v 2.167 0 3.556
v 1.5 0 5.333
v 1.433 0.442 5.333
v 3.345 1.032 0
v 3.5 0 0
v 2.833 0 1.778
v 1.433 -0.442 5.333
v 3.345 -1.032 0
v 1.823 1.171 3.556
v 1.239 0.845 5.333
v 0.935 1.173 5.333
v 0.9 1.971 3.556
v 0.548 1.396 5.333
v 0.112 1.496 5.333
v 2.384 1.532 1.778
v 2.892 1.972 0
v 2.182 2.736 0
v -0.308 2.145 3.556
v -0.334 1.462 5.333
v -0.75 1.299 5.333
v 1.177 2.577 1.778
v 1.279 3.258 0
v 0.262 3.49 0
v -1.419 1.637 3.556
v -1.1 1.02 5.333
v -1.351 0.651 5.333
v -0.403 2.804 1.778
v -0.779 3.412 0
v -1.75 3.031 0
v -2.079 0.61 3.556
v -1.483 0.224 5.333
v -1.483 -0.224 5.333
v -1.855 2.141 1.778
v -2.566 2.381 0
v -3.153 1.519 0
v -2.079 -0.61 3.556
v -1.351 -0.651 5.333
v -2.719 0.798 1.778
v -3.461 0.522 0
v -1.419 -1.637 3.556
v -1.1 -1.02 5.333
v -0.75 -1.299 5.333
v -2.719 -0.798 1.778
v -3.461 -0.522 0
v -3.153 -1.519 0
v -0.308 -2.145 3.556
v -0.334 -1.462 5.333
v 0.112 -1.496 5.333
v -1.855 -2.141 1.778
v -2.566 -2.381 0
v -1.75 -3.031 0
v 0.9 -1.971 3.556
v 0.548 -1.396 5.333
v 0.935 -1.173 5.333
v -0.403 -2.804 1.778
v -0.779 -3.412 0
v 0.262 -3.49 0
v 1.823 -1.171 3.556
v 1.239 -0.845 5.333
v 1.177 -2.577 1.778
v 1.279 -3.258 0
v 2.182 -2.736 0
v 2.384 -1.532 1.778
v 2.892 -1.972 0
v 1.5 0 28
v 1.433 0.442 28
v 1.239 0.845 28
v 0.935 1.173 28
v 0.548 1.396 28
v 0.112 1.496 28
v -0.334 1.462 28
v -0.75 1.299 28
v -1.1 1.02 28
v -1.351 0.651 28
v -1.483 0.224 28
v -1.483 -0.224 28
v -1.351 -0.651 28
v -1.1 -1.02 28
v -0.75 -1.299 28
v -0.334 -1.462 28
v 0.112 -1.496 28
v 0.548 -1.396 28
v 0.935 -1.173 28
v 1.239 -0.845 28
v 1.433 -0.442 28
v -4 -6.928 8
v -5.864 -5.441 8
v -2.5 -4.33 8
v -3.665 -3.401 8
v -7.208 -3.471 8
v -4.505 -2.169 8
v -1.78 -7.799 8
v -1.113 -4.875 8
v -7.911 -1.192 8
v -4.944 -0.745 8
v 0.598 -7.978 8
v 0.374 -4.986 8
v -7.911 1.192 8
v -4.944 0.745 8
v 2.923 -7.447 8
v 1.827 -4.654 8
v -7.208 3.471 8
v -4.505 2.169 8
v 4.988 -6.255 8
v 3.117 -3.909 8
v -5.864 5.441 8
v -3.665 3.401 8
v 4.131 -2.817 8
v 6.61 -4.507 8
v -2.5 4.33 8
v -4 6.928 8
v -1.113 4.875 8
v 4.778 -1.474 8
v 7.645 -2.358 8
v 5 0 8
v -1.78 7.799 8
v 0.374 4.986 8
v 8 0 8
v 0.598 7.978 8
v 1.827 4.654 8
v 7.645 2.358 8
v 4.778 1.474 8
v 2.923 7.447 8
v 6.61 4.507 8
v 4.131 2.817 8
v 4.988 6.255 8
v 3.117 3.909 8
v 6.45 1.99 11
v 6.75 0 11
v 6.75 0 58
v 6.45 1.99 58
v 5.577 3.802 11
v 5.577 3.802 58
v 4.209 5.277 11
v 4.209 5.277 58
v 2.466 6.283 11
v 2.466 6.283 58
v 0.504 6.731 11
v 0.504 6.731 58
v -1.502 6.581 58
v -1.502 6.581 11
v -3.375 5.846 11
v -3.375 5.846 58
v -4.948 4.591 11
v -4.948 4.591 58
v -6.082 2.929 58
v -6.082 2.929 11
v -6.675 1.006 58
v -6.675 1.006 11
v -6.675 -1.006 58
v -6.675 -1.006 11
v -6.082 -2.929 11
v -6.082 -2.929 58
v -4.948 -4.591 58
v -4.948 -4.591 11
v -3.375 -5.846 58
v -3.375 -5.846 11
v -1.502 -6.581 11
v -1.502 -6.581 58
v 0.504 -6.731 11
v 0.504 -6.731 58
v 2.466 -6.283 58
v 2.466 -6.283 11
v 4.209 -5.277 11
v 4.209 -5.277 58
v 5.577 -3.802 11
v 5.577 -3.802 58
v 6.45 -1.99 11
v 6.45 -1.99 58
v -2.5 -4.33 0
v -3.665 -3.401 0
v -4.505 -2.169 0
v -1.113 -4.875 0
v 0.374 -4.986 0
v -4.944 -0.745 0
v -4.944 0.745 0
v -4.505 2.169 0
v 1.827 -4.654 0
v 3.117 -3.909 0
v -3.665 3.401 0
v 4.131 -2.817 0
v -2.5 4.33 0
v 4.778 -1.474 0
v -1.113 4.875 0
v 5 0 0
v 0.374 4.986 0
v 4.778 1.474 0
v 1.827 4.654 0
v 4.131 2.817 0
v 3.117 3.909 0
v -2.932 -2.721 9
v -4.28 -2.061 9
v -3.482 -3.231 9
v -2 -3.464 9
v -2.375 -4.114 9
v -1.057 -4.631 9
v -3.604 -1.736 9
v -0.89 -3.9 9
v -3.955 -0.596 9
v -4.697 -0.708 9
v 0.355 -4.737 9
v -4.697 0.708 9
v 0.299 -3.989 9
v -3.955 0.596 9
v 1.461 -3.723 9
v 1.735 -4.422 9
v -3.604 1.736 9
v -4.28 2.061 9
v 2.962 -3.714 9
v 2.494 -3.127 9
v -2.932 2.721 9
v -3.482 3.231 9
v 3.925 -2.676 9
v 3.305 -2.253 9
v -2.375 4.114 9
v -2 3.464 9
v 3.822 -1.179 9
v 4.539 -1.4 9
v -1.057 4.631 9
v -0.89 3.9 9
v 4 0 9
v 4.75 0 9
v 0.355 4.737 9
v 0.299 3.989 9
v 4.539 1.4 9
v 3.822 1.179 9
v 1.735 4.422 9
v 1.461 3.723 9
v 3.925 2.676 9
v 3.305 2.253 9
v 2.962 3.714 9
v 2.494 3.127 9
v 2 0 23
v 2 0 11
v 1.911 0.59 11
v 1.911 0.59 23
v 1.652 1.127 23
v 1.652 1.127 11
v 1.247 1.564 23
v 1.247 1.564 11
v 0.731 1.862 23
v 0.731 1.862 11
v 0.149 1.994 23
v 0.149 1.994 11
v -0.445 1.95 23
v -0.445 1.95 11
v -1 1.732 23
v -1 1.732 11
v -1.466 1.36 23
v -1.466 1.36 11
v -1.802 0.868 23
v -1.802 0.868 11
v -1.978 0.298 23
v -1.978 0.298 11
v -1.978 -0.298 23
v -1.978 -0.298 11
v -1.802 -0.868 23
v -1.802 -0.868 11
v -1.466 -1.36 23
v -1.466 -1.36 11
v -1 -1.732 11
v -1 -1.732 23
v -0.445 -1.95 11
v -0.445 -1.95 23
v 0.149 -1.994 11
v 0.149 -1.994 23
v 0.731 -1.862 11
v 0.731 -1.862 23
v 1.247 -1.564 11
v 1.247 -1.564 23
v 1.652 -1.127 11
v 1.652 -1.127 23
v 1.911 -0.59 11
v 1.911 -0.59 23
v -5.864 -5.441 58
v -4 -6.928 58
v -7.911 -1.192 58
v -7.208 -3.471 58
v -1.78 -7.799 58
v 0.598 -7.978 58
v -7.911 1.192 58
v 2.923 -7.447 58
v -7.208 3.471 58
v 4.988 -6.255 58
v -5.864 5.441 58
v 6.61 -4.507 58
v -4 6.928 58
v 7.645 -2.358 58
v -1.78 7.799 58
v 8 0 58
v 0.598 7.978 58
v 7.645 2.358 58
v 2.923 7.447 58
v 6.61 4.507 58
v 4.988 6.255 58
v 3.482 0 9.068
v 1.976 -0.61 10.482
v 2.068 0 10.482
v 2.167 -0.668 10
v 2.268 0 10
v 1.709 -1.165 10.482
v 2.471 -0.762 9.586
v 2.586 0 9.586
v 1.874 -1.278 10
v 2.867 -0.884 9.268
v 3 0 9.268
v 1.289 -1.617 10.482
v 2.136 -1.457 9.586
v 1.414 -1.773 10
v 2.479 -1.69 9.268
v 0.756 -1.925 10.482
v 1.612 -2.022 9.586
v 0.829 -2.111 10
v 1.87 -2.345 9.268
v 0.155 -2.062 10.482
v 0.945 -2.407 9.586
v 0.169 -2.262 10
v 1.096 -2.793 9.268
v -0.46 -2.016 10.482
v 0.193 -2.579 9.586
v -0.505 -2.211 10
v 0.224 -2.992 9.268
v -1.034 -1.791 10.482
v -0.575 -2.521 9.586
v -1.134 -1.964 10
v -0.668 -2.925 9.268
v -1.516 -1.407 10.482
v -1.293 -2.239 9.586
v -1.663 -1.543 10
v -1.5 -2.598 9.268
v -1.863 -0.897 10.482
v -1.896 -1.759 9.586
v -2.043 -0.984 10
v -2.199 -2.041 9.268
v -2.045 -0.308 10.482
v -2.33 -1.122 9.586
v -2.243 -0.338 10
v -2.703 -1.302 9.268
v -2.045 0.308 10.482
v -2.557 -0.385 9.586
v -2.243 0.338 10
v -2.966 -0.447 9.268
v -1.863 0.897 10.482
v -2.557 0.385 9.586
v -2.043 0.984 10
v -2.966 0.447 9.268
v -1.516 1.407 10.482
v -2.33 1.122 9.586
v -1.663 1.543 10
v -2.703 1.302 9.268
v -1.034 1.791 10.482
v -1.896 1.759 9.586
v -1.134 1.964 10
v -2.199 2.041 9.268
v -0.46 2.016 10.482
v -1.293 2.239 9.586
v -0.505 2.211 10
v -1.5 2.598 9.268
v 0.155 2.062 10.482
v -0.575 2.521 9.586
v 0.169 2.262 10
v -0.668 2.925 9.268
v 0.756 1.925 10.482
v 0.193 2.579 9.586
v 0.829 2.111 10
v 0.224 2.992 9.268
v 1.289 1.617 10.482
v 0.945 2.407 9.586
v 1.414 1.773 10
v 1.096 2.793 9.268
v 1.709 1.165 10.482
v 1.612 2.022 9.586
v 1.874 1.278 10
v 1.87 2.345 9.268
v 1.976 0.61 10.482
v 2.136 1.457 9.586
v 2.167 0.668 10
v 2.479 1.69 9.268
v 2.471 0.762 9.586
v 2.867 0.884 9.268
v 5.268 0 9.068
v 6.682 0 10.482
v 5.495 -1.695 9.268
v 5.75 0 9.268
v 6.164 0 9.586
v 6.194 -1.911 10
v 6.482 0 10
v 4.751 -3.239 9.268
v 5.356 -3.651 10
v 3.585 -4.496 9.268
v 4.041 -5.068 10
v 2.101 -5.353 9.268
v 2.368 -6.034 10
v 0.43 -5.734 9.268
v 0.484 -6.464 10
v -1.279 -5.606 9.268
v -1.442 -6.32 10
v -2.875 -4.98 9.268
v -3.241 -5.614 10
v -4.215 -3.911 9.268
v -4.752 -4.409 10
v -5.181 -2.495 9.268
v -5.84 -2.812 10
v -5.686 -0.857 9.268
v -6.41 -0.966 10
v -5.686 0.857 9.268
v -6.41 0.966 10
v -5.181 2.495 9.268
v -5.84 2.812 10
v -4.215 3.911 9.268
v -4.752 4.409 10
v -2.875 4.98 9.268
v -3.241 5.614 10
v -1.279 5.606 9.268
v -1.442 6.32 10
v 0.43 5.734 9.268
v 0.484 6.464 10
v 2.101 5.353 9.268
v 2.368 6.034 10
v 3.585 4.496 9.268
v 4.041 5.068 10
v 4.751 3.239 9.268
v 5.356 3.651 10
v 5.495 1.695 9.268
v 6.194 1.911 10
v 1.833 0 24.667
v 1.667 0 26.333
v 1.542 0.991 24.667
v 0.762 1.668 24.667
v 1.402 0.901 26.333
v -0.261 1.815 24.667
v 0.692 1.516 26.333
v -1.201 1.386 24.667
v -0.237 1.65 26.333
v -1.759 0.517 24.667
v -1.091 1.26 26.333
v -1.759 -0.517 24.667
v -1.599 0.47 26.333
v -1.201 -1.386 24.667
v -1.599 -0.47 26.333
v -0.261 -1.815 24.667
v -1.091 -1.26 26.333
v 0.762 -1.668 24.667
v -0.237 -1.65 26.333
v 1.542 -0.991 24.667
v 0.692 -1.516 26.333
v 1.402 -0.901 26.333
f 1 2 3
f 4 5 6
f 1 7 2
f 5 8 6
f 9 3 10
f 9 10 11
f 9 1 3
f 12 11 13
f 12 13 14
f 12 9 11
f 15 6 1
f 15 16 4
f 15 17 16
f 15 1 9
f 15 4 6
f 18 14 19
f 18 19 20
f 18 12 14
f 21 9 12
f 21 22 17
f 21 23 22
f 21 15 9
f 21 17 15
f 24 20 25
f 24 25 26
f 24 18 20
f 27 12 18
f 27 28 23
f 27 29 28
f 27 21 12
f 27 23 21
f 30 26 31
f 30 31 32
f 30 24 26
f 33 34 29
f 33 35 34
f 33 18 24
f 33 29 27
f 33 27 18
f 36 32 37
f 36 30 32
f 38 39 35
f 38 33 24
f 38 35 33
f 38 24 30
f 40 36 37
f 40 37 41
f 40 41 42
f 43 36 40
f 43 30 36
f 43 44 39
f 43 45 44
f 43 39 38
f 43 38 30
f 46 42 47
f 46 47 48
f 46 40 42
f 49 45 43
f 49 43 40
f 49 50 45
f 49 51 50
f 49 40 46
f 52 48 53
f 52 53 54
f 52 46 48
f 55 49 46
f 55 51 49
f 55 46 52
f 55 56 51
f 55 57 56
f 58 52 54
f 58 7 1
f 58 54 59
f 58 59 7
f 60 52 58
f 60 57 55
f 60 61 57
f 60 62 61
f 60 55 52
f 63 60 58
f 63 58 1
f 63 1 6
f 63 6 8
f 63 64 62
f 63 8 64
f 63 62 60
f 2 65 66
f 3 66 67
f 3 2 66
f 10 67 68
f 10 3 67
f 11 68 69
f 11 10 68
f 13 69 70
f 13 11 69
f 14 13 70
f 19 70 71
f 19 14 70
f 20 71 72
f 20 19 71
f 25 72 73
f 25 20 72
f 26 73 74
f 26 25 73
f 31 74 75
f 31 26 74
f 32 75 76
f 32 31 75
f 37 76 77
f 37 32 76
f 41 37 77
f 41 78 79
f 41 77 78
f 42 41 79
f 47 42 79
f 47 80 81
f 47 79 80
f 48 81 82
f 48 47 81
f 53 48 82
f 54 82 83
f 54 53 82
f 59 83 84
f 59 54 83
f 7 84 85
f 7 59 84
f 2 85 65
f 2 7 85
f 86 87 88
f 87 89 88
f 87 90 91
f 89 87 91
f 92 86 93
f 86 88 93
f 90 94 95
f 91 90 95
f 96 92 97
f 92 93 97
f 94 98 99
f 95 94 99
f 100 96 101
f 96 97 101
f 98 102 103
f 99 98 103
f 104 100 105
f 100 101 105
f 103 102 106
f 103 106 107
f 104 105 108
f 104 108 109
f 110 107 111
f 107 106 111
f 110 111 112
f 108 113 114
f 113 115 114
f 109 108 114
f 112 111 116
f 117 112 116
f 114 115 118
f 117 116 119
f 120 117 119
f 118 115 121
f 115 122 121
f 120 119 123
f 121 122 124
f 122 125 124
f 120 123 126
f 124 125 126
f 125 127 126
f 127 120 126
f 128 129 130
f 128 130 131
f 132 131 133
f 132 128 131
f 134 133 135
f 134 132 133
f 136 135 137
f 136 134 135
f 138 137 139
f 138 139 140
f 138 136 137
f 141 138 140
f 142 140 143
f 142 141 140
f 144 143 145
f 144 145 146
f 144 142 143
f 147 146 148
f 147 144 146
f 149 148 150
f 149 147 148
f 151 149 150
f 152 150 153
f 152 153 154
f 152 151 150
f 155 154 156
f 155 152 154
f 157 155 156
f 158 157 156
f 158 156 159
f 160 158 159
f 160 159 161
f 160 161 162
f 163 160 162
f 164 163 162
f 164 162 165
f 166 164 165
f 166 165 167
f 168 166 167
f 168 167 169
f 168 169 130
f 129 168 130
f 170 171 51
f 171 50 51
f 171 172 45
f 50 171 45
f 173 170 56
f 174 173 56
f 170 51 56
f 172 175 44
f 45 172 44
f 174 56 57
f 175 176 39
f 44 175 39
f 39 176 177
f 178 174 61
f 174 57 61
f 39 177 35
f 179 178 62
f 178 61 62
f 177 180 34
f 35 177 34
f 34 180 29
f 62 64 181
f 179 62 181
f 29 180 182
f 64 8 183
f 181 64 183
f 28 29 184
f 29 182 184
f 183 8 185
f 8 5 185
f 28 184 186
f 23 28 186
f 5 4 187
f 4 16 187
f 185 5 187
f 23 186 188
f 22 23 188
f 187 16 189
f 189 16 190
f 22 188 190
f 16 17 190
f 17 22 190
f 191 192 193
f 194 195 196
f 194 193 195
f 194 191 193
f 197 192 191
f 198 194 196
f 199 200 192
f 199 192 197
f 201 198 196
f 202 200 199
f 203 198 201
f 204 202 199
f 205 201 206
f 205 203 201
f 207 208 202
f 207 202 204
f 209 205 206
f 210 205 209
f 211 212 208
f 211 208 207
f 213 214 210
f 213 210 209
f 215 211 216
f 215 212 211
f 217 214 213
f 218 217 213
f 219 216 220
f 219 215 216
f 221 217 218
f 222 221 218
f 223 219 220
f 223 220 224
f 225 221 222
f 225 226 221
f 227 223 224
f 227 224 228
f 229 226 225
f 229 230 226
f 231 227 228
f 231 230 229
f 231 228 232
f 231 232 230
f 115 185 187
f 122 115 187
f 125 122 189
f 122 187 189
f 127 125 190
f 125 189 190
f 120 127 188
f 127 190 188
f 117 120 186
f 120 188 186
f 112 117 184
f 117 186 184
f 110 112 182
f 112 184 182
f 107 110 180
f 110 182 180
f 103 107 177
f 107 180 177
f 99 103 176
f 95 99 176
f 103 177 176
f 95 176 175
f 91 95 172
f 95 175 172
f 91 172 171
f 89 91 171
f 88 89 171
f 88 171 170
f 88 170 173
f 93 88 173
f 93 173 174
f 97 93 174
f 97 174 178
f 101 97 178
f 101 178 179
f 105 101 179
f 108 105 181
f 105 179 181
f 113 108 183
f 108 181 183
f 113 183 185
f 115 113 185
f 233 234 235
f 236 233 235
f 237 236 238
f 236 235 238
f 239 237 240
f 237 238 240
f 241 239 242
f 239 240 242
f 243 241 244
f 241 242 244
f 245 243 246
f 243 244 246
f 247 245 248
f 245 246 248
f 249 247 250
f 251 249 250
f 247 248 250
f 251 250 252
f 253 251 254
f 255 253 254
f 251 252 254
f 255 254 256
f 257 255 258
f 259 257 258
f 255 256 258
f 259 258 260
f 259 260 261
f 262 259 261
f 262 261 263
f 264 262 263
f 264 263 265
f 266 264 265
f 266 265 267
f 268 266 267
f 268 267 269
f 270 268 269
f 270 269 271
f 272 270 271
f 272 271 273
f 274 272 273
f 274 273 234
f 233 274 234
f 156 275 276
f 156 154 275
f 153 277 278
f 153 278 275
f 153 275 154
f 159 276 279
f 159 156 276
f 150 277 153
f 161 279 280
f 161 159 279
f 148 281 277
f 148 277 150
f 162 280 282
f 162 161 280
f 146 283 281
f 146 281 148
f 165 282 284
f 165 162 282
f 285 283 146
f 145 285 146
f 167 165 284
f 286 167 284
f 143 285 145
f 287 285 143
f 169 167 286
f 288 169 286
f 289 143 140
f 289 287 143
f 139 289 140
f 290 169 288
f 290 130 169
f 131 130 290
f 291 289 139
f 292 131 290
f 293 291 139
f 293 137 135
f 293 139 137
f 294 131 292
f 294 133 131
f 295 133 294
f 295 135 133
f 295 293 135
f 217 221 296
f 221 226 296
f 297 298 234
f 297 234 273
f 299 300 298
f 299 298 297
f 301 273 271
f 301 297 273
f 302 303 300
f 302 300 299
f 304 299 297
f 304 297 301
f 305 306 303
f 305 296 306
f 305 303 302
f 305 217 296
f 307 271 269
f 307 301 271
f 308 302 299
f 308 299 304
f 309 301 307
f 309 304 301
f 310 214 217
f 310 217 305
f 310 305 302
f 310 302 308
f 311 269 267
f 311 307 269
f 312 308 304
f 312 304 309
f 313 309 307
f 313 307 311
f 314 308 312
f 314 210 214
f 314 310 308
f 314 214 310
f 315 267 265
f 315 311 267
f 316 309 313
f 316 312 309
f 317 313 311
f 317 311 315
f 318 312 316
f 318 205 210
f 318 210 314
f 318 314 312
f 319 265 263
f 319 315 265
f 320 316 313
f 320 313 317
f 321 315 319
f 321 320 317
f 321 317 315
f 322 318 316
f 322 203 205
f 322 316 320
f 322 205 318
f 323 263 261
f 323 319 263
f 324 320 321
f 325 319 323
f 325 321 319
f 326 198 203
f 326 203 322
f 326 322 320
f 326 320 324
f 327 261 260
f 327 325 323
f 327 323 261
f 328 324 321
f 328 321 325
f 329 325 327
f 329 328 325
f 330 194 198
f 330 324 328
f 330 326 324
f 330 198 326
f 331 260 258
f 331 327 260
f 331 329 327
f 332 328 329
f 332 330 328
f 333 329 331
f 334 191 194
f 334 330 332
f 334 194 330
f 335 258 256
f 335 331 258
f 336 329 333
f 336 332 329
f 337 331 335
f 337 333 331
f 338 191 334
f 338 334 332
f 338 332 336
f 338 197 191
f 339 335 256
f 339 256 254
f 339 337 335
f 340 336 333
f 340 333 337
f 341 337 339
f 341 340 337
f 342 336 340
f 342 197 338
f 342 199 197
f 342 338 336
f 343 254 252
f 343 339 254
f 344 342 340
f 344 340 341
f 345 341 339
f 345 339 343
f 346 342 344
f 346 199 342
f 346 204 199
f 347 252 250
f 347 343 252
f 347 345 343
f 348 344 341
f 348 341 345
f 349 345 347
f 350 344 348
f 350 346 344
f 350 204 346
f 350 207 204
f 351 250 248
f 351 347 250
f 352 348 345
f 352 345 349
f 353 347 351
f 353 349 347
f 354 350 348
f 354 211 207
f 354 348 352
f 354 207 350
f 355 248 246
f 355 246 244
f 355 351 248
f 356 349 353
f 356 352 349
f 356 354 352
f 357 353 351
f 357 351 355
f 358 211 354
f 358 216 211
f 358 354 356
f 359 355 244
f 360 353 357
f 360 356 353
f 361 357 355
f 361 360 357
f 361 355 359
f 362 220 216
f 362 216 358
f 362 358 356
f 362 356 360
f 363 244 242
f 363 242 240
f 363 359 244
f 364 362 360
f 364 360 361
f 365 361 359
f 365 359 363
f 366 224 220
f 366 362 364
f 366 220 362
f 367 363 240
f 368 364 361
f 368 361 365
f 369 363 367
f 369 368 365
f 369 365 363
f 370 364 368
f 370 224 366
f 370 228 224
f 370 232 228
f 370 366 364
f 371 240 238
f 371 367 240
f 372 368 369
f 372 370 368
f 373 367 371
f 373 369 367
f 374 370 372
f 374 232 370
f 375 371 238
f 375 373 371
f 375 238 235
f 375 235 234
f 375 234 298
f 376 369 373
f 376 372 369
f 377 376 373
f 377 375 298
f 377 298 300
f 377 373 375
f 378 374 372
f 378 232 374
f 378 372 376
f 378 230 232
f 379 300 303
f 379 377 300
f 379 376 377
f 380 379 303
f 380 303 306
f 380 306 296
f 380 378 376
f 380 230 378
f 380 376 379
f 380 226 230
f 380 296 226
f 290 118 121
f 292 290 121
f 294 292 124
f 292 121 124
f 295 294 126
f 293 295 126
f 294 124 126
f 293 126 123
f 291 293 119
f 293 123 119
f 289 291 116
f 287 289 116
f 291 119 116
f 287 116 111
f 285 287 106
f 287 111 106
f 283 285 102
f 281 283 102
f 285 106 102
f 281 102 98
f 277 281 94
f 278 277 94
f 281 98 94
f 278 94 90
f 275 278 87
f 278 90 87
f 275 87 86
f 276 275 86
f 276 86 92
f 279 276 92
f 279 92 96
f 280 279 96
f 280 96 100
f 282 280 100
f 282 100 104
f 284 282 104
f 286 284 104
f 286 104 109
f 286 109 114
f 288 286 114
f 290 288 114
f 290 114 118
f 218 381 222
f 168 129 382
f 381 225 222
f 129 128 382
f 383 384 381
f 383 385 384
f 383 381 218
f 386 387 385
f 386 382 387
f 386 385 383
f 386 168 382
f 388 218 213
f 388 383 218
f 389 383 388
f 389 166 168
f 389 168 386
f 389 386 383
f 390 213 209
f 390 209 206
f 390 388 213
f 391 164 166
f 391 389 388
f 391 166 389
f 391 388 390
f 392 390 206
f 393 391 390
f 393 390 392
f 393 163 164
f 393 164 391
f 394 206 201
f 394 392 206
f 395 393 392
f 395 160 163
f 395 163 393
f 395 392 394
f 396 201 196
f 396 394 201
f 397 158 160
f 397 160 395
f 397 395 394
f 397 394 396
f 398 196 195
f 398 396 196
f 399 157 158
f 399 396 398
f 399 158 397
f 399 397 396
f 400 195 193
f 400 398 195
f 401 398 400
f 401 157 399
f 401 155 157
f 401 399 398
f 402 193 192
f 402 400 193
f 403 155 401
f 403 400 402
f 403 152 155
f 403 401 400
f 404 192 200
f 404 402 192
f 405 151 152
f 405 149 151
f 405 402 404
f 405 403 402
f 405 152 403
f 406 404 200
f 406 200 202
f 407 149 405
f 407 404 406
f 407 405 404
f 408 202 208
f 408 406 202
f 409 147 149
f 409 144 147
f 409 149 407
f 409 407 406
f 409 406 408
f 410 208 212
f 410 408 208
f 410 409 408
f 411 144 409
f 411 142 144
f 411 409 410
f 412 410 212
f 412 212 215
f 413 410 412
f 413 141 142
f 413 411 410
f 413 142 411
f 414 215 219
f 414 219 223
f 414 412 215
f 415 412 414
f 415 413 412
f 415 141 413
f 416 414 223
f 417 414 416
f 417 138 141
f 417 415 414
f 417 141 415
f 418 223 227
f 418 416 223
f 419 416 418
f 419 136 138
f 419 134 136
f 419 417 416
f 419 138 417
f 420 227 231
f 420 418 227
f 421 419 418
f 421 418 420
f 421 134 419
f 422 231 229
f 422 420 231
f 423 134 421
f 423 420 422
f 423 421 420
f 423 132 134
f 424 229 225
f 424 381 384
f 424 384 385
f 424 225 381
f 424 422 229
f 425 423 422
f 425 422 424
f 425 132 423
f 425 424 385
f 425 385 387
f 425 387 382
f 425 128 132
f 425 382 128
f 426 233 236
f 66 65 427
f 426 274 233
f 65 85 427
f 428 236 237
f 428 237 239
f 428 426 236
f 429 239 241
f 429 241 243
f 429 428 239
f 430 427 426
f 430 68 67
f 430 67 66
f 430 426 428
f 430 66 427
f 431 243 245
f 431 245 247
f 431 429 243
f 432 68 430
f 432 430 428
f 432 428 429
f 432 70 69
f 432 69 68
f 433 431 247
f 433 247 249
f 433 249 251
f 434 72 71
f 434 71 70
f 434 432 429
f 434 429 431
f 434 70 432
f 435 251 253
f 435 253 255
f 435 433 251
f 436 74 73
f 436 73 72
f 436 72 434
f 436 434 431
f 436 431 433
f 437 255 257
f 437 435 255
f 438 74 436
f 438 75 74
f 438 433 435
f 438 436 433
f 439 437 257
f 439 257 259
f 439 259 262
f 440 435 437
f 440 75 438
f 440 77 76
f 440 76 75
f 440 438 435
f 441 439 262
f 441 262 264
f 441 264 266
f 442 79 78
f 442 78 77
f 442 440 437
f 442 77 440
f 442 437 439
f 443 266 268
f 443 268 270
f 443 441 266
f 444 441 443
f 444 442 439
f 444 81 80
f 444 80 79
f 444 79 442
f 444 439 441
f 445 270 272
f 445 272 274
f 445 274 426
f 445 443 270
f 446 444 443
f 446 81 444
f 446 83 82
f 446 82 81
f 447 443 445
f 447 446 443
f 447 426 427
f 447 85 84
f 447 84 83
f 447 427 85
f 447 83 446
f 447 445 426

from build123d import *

# Parameters (mm, degrees)
F0_R        = 5
F0_R_2      = 3.5
F1_DEPTH    = 8
F2_R        = 8
F2_R_2      = 6.75
F2_R_3      = 5
F2_R_4      = 3.5
F2_R_5      = 2
F2_R_6      = 1.5
F3_DEPTH    = 1
F4_DEPTH    = 50
F5_DEPTH    = 25
F6_S5_R     = 1.5
F6_T6_DEPTH = 8
F7_R        = 2
F9_R        = 2


# Not quite as in the source:
# - a fillet or chamfer that OpenCascade refuses, or shapes differently, is made with other operations: its cross-section is extruded or revolved along the edge and cut away or added


with BuildPart() as f1:
    # F0 (on Top) → F1 (new body)
    with BuildSketch(Plane.XY):
        Circle(F0_R)
        Circle(F0_R_2, mode=Mode.SUBTRACT)
    extrude(amount=F1_DEPTH)

    # F2 (on face) → F3 (join)
    with BuildSketch(Plane.XY.offset(8)):
        Circle(F2_R)
        Circle(F2_R_2, mode=Mode.SUBTRACT)
        Circle(F2_R_2)
        Circle(F2_R_3, mode=Mode.SUBTRACT)
        Circle(F2_R_3)
        Circle(F2_R_4, mode=Mode.SUBTRACT)
        Circle(F2_R_4)
        Circle(F2_R_5, mode=Mode.SUBTRACT)
        Circle(F2_R_5)
        Circle(F2_R_6, mode=Mode.SUBTRACT)
    extrude(amount=F3_DEPTH)

    # F2 (on face) → F4 (join)
    with BuildSketch(Plane.XY.offset(8)):
        Circle(F2_R)
        Circle(F2_R_2, mode=Mode.SUBTRACT)
    extrude(amount=F4_DEPTH)

    # F2 (on face) → F5 (join)
    with BuildSketch(Plane.XY.offset(8)):
        Circle(F2_R_5)
        Circle(F2_R_6, mode=Mode.SUBTRACT)
    extrude(amount=F5_DEPTH)

    # F6: chamfer of 8 x 3 on 1 edges, made by hand


with BuildPart() as f6_tool2:
    # F6_s3 → F6_t4 (revolve)
    with BuildSketch(Plane.XZ):
        Polygon((0.5, 8), (3.5, 0), (3.5, 8), align=None)
    revolve(axis=Axis((0, 0, 8), (0, 0, 1)))

    # F6_s5 → F6_t6 (cut, symmetric)
    with BuildSketch(Plane.XY.offset(4)):
        Circle(F6_S5_R)
    extrude(amount=F6_T6_DEPTH, both=True, mode=Mode.SUBTRACT)

    split(bisect_by=Plane.XY, keep=Keep.TOP)


with BuildPart() as f1_1:
    add(f1.part)

    # F6_t1: union F6_tool2
    add(f6_tool2.part)

    # F7
    f7_edges = [f1_1.edges().sort_by_distance(p)[0] for p in [
        (-2, 0, 9),
    ]]
    fillet(f7_edges, radius=F7_R)

    # F8: chamfer of 1 x 10 on 1 edges, made by hand

    # F8_s1 → F8_t2 (revolve, cut)
    with BuildSketch(Plane.XZ):
        Polygon((2, 23), (1, 33), (2, 33), align=None)
    revolve(axis=Axis((0, 0, 33), (0, 0, 1)), mode=Mode.SUBTRACT)

    # F9
    f9_edges = [f1_1.edges().sort_by_distance(p)[0] for p in [
        (-6.75, 0, 9),
    ]]
    fillet(f9_edges, radius=F9_R)


solid = f1_1.part
